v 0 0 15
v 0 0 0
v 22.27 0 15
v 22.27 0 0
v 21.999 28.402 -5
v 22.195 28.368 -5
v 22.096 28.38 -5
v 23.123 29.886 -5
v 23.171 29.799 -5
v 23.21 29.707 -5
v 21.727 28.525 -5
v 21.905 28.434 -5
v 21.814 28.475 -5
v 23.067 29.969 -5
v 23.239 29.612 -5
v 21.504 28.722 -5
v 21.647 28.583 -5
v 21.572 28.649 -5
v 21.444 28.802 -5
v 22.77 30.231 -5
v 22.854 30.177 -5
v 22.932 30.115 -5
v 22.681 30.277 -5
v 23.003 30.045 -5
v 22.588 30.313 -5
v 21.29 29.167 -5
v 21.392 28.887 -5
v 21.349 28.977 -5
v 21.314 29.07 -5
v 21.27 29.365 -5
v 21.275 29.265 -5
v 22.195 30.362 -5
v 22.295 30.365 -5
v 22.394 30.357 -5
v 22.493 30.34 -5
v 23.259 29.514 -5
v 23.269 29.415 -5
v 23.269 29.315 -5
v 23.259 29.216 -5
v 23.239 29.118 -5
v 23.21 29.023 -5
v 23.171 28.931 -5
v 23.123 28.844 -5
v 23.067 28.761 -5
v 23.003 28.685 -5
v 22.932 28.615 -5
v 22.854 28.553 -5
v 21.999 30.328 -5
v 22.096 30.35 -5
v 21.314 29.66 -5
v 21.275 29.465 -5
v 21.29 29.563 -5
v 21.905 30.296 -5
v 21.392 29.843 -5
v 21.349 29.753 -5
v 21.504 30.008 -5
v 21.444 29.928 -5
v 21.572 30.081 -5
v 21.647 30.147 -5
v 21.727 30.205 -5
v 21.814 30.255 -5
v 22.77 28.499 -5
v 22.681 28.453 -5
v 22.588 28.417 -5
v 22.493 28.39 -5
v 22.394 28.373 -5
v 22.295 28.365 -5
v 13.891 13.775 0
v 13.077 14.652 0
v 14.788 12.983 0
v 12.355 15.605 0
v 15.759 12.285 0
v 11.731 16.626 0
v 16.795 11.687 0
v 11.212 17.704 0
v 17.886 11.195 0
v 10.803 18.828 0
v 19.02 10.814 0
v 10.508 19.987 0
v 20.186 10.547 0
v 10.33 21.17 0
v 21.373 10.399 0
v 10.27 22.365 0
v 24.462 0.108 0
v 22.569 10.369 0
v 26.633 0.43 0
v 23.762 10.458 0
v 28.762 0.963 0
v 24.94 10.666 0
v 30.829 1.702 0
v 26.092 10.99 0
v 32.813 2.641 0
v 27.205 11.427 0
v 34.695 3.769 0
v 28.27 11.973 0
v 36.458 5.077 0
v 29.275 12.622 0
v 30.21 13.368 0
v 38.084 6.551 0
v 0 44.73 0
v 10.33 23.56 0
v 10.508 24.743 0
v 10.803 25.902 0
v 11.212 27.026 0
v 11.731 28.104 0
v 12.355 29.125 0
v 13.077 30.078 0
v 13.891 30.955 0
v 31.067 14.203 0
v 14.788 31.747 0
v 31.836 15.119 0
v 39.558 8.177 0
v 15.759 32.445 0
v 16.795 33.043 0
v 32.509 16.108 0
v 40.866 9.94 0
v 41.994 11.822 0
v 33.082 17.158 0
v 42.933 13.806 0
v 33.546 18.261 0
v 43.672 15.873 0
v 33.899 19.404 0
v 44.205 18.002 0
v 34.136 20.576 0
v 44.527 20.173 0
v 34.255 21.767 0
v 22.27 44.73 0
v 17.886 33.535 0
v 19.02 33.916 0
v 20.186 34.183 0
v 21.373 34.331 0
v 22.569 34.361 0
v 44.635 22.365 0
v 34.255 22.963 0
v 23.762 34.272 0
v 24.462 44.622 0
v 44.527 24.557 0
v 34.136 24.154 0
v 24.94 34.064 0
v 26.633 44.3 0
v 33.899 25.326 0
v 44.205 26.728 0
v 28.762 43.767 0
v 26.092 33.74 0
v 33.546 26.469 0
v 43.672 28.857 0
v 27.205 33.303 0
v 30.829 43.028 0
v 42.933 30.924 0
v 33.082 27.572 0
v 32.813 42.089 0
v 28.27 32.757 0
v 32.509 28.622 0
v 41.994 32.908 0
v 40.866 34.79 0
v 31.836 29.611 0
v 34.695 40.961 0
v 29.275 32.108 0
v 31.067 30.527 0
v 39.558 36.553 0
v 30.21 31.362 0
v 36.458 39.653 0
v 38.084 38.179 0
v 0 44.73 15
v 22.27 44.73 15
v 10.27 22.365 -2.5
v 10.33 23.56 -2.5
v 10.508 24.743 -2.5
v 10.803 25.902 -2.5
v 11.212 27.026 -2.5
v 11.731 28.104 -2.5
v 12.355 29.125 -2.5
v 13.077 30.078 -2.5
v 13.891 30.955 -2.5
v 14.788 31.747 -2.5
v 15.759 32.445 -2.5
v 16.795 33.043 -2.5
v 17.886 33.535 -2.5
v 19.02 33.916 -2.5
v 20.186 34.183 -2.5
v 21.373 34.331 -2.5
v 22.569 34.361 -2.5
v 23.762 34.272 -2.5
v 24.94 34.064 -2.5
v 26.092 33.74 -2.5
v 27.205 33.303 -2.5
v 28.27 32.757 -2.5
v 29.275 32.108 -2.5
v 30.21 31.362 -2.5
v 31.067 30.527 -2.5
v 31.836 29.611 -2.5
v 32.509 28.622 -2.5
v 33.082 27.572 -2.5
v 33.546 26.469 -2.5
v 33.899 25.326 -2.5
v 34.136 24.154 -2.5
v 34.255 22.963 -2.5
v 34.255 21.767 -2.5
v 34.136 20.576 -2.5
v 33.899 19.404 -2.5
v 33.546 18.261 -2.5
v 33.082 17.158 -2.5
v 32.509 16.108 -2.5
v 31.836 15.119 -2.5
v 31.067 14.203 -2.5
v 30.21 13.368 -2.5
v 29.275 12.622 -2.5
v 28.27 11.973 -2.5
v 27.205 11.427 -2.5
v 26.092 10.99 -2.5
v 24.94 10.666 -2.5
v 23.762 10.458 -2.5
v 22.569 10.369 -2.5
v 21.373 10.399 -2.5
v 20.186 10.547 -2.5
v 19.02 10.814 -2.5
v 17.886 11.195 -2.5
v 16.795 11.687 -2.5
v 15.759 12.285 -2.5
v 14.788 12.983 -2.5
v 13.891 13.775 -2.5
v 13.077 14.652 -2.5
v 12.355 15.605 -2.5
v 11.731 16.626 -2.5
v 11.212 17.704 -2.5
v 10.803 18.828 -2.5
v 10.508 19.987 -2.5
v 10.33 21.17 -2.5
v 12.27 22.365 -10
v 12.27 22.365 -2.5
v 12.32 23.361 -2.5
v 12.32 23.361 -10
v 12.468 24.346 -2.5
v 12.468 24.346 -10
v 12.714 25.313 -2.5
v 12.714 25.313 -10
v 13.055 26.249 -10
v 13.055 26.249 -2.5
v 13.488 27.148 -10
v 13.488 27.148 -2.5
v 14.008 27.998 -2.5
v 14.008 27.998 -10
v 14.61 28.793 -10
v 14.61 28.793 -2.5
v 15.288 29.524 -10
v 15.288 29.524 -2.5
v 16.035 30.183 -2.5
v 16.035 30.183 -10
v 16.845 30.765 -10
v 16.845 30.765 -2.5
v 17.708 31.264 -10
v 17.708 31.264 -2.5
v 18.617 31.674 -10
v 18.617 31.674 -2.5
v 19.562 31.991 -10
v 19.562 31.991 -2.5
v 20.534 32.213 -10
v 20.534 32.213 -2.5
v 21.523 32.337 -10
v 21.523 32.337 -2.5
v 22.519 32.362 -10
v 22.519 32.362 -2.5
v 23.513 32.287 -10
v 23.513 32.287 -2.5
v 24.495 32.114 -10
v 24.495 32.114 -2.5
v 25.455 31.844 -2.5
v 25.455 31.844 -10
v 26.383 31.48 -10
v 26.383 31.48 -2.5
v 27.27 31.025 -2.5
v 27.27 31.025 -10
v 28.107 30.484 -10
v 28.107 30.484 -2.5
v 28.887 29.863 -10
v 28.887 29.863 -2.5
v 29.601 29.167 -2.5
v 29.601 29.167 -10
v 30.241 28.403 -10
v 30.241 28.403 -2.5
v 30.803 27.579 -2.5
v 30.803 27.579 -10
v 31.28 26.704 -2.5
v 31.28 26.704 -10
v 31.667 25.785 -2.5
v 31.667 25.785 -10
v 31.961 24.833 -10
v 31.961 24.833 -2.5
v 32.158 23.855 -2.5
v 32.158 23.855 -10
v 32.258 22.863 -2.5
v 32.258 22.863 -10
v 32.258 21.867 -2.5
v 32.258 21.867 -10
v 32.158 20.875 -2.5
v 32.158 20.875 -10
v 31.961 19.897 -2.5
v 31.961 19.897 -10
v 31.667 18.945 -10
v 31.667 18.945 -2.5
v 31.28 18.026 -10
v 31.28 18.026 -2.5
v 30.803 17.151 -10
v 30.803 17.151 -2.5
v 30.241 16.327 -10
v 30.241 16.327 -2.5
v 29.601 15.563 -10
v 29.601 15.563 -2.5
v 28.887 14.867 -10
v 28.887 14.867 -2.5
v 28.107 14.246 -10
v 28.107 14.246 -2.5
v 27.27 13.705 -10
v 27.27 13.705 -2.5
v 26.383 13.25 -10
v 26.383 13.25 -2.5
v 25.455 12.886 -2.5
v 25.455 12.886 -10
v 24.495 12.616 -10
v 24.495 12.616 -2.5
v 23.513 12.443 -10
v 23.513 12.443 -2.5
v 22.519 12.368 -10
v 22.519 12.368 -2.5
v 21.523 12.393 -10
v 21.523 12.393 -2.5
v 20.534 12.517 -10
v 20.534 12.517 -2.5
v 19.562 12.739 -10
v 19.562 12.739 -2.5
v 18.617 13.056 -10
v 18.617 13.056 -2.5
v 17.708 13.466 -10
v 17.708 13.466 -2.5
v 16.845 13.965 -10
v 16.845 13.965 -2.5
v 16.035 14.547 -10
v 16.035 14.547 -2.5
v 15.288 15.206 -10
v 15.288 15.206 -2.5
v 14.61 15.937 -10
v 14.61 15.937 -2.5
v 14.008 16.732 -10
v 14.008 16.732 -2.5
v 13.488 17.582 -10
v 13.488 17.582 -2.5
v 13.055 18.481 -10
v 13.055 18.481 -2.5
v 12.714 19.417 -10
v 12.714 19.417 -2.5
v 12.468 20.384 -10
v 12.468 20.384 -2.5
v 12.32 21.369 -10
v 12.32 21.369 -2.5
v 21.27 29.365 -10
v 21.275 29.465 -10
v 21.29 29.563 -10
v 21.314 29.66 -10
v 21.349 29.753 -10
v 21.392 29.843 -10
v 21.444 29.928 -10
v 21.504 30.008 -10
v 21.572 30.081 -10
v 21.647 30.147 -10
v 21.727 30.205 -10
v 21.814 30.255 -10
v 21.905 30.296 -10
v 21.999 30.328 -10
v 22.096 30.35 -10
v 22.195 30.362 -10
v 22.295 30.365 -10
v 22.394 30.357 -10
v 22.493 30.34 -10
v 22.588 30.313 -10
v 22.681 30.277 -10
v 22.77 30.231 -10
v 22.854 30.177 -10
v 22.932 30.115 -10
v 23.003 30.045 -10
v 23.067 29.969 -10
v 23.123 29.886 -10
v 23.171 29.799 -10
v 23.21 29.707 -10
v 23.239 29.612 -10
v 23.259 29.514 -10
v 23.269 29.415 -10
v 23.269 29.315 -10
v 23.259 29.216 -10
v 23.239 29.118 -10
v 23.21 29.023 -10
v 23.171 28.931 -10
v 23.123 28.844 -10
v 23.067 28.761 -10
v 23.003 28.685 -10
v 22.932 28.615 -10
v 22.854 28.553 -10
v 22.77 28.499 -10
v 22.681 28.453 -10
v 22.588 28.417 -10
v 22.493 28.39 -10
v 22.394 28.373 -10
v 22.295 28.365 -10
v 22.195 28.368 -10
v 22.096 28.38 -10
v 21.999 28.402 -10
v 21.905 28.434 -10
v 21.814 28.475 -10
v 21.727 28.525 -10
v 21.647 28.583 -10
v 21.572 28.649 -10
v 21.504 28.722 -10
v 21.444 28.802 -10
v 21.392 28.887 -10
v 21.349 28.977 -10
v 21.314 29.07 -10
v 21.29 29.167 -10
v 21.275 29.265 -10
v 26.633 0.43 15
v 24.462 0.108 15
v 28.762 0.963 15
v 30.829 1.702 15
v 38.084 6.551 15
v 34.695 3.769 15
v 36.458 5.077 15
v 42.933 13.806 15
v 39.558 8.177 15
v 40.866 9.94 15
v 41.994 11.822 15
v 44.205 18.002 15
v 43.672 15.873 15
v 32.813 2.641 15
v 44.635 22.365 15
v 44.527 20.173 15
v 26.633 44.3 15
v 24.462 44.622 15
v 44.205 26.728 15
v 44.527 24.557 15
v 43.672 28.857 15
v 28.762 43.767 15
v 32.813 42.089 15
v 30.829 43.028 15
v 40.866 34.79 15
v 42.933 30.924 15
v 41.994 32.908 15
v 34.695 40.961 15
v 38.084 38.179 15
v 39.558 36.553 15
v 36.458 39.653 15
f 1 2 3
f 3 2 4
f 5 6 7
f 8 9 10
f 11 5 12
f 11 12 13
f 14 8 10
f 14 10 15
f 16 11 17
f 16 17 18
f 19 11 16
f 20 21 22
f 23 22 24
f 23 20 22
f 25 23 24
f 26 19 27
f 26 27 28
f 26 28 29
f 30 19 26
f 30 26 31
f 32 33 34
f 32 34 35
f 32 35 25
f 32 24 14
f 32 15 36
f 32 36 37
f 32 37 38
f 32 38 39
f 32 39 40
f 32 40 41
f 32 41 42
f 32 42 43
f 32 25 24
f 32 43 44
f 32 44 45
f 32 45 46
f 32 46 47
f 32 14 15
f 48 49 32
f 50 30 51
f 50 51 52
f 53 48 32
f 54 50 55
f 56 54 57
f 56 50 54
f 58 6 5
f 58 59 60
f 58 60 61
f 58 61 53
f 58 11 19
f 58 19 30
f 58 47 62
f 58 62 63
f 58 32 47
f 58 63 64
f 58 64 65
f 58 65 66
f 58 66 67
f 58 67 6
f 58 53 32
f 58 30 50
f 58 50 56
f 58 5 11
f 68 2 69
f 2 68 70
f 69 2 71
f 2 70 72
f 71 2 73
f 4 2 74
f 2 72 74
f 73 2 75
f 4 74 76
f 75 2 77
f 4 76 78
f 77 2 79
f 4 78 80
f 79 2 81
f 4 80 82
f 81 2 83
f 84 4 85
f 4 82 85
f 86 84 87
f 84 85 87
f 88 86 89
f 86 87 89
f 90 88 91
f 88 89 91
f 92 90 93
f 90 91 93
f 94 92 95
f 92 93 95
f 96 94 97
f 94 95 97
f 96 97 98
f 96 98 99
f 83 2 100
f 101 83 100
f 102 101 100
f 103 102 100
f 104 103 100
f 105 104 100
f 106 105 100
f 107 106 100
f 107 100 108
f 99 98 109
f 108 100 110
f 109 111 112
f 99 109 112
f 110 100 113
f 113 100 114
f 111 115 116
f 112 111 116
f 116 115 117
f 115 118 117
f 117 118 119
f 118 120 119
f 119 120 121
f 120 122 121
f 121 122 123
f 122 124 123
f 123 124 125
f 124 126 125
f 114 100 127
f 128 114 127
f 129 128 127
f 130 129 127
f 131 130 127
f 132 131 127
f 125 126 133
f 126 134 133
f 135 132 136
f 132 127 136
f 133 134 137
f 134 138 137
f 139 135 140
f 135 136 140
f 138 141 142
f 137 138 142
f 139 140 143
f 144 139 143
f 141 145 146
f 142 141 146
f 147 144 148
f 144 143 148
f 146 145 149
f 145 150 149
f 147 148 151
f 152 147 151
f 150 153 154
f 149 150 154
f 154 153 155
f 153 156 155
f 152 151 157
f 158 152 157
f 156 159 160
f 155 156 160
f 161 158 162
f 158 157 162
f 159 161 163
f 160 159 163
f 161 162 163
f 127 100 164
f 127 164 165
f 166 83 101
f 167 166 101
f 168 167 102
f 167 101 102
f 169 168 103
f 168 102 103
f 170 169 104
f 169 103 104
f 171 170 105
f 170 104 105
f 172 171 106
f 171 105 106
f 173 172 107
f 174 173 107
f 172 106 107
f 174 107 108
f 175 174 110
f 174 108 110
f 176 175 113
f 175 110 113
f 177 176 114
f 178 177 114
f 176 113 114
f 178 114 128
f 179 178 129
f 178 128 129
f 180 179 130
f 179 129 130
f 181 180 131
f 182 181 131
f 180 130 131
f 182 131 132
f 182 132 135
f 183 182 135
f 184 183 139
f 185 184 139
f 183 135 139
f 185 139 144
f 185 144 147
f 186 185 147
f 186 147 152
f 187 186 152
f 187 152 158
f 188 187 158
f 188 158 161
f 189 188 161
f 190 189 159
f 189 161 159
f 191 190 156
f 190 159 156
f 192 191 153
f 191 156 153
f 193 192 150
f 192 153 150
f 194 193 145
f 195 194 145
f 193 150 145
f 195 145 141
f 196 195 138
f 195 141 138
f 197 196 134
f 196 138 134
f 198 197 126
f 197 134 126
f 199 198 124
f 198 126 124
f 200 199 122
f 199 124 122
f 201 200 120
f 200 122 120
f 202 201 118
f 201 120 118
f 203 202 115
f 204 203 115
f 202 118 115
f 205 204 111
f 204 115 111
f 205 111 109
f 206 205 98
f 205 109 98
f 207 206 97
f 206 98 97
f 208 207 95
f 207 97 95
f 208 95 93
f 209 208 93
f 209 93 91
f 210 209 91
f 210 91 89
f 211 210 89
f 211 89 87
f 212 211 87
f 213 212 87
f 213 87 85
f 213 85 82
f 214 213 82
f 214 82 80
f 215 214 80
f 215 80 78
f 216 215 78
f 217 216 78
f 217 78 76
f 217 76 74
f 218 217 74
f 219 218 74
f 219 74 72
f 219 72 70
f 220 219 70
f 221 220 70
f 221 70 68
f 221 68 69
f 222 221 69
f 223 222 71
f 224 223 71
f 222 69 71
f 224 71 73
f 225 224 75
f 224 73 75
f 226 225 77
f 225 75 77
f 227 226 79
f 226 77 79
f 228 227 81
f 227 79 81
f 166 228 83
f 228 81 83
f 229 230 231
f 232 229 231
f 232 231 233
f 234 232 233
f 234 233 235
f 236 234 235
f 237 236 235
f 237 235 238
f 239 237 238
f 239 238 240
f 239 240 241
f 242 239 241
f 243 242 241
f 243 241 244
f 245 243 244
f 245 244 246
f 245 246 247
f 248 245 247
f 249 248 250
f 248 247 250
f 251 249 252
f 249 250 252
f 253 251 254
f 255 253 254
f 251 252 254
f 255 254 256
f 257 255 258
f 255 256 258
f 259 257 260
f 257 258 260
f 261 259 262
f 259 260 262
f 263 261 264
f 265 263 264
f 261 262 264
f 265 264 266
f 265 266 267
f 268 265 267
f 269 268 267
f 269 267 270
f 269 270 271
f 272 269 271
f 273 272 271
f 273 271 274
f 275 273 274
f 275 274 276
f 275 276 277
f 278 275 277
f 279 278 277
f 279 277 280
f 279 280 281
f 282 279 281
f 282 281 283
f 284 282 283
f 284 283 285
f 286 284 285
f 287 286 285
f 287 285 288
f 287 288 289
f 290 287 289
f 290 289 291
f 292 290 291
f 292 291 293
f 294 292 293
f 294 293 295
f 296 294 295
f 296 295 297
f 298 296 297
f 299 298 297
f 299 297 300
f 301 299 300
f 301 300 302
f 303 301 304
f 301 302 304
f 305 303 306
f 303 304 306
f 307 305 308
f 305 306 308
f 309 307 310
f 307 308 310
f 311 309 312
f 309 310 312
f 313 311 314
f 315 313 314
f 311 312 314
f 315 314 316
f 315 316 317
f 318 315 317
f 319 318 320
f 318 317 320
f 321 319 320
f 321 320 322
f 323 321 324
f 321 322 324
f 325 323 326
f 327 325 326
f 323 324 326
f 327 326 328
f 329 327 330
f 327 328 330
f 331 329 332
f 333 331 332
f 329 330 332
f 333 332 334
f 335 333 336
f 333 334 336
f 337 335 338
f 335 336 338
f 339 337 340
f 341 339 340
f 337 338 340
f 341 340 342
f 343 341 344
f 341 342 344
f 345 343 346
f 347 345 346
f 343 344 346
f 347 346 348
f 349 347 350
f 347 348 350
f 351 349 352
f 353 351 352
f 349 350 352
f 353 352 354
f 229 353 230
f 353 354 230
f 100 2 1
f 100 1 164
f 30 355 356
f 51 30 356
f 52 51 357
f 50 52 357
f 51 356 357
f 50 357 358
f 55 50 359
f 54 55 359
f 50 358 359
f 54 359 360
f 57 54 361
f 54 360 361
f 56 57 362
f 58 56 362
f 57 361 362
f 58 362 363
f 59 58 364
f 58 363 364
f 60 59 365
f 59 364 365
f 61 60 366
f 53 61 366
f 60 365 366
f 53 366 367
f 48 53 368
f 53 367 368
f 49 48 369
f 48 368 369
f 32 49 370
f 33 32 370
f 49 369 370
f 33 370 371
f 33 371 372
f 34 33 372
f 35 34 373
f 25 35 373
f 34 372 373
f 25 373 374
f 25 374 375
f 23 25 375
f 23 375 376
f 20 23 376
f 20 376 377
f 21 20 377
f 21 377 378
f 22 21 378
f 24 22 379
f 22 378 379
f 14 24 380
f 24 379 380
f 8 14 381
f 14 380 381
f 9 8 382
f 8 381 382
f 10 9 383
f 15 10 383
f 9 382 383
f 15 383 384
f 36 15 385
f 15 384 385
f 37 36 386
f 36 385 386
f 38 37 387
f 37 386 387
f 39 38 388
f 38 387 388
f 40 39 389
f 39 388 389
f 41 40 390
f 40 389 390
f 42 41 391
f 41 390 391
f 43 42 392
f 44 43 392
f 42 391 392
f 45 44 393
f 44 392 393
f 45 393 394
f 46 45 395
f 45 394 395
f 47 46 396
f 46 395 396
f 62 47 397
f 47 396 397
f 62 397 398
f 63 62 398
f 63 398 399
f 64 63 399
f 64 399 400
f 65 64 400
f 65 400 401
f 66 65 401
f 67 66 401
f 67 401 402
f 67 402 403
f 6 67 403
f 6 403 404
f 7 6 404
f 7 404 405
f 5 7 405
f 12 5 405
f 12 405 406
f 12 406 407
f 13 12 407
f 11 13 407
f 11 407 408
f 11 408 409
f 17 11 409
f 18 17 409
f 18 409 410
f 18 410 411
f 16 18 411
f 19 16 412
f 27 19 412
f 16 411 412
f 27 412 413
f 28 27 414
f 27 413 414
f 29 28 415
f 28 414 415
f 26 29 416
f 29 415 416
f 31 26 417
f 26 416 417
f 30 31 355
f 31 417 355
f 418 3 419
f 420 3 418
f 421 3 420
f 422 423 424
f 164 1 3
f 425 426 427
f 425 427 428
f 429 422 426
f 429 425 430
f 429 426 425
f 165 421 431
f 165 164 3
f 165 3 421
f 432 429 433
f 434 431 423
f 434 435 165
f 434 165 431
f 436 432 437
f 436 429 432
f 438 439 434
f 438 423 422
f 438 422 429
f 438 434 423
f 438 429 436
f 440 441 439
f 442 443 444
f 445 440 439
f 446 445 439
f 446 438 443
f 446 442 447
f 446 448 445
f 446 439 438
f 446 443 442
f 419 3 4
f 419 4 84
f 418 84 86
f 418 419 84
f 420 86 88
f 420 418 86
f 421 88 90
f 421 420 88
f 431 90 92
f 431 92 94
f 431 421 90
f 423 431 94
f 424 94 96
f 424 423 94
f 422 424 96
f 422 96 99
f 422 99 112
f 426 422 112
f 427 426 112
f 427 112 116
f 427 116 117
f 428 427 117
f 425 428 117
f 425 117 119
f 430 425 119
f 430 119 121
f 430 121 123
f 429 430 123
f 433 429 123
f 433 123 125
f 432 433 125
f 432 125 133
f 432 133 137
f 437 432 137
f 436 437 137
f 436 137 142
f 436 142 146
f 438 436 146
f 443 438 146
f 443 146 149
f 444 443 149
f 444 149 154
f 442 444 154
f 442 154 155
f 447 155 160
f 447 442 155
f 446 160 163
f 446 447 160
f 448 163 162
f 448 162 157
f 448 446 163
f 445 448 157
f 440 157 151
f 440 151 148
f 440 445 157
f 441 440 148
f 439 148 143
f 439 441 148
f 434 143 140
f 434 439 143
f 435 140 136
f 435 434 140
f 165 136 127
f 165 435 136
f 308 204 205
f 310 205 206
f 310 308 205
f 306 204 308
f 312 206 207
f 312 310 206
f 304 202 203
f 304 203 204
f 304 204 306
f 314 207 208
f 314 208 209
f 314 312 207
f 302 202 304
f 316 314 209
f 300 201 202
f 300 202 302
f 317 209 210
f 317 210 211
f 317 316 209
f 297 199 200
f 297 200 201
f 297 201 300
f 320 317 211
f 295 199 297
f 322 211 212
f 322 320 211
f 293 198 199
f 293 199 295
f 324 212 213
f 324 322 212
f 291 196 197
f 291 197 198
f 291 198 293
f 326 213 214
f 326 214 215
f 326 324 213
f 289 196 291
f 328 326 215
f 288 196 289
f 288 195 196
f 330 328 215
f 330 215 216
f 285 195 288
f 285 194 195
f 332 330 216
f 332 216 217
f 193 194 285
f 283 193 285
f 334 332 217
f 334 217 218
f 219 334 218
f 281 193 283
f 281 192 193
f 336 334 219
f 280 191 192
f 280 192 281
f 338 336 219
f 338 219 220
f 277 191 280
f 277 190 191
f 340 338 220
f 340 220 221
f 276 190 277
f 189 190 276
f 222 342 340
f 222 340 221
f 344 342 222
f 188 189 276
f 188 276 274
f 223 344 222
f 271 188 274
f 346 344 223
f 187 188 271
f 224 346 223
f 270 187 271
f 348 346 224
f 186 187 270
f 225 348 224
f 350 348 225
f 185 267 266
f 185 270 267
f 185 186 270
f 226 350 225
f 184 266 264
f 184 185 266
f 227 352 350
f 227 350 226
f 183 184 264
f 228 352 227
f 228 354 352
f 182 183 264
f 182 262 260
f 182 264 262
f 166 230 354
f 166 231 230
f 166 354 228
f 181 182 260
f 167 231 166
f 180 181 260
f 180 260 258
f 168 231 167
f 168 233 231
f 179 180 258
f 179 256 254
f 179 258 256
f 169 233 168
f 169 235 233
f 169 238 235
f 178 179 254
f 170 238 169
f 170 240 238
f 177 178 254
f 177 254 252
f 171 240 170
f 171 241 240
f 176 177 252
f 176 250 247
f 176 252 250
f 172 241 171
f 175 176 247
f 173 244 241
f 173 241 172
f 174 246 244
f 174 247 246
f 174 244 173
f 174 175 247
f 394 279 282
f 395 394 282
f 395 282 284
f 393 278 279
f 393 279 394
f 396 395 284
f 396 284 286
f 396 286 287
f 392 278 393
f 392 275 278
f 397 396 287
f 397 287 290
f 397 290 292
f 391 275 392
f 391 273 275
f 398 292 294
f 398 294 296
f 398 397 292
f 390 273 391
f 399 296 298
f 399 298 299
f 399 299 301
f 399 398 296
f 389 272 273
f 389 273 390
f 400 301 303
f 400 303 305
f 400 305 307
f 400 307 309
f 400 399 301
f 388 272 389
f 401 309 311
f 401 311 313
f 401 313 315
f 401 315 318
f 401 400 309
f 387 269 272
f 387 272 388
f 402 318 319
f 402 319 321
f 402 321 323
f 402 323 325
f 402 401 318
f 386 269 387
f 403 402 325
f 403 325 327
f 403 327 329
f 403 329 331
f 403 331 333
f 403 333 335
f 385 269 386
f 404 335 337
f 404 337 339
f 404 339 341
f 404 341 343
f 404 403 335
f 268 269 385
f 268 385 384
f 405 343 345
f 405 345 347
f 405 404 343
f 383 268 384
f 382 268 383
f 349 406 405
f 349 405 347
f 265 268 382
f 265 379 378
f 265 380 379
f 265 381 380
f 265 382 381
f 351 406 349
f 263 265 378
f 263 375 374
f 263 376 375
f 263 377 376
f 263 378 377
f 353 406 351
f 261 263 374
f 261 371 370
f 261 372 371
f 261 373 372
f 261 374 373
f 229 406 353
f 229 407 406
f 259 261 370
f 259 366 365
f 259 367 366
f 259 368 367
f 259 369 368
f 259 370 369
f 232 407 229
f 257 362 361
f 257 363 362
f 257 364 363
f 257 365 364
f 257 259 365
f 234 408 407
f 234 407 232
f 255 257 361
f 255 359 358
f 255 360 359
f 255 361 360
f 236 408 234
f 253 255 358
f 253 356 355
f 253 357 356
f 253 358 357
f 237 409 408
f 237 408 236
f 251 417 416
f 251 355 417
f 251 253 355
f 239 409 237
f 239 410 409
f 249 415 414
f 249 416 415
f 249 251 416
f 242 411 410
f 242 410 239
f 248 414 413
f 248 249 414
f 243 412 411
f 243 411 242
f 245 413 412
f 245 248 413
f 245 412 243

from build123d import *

# Parameters (mm, degrees)
SKETCH_1_W          = 189.06
SKETCH_1_H          = 44.73
EXTRUDE_1_DEPTH     = 15
CUT_EXTRUDE_4_REACH = 196.858
SKETCH_6_R          = 10
EXTRUDE_2_DEPTH     = 10
SKETCH_7_R          = 1
CUT_EXTRUDE_6_DEPTH = 5
SKETCH_8_R          = 12
SKETCH_8_R_2        = 10
EXTRUDE_3_DEPTH     = 2.5


with BuildPart() as part:
    # 草图1 → 凸台-拉伸1 (new body)
    with BuildSketch(Plane.XY):
        with Locations((94.53, 22.365)):
            Rectangle(SKETCH_1_W, SKETCH_1_H)
    extrude(amount=EXTRUDE_1_DEPTH)

    # 草图4 → 切除-拉伸4 (cut, up to next)
    with BuildSketch(Plane.XY.offset(15), mode=Mode.PRIVATE) as cut_extrude_4_sk1:
        with BuildLine():
            Line((22.27, 44.73), (189.06, 44.73))
            Line((189.06, 44.73), (189.06, 0))
            Line((189.06, 0), (22.27, 0))
            ThreePointArc((22.27, 0), (44.635, 22.365), (22.27, 44.73))
        make_face()
    cut_extrude_4_tool1 = extrude(cut_extrude_4_sk1.sketch, amount=-CUT_EXTRUDE_4_REACH, mode=Mode.PRIVATE) & part.part
    add(cut_extrude_4_tool1.solids().sort_by_distance((114.364224, 22.365, 15))[0], mode=Mode.SUBTRACT)

    # 草图6 → 凸台-拉伸2 (add)
    with BuildSketch(Plane(origin=(0, 0, 0), x_dir=(-1, 0, 0), z_dir=(0, 0, -1))):
        with Locations((-22.27, 22.365)):
            Circle(SKETCH_6_R)
    extrude(amount=EXTRUDE_2_DEPTH)

    # 草图7 → 切除-拉伸6 (cut)
    with BuildSketch(Plane(origin=(0, 0, -10), x_dir=(-1, 0, 0), z_dir=(0, 0, -1))):
        with Locations((-22.27, 29.365)):
            Circle(SKETCH_7_R)
        with Locations((-15.27, -108.576623388)):
            Circle(SKETCH_7_R)
        with Locations((-153.211623388, -115.576623388)):
            Circle(SKETCH_7_R)
        with Locations((-160.211623388, 22.365)):
            Circle(SKETCH_7_R)
    extrude(amount=-CUT_EXTRUDE_6_DEPTH, mode=Mode.SUBTRACT)

    # 草图8 → 凸台-拉伸3 (add)
    with BuildSketch(Plane(origin=(0, 0, 0), x_dir=(-1, 0, 0), z_dir=(0, 0, -1))):
        with Locations((-22.27, 22.365)):
            Circle(SKETCH_8_R)
        with Locations((-22.27, 22.365)):
            Circle(SKETCH_8_R_2, mode=Mode.SUBTRACT)
    extrude(amount=EXTRUDE_3_DEPTH)


solid = part.part
